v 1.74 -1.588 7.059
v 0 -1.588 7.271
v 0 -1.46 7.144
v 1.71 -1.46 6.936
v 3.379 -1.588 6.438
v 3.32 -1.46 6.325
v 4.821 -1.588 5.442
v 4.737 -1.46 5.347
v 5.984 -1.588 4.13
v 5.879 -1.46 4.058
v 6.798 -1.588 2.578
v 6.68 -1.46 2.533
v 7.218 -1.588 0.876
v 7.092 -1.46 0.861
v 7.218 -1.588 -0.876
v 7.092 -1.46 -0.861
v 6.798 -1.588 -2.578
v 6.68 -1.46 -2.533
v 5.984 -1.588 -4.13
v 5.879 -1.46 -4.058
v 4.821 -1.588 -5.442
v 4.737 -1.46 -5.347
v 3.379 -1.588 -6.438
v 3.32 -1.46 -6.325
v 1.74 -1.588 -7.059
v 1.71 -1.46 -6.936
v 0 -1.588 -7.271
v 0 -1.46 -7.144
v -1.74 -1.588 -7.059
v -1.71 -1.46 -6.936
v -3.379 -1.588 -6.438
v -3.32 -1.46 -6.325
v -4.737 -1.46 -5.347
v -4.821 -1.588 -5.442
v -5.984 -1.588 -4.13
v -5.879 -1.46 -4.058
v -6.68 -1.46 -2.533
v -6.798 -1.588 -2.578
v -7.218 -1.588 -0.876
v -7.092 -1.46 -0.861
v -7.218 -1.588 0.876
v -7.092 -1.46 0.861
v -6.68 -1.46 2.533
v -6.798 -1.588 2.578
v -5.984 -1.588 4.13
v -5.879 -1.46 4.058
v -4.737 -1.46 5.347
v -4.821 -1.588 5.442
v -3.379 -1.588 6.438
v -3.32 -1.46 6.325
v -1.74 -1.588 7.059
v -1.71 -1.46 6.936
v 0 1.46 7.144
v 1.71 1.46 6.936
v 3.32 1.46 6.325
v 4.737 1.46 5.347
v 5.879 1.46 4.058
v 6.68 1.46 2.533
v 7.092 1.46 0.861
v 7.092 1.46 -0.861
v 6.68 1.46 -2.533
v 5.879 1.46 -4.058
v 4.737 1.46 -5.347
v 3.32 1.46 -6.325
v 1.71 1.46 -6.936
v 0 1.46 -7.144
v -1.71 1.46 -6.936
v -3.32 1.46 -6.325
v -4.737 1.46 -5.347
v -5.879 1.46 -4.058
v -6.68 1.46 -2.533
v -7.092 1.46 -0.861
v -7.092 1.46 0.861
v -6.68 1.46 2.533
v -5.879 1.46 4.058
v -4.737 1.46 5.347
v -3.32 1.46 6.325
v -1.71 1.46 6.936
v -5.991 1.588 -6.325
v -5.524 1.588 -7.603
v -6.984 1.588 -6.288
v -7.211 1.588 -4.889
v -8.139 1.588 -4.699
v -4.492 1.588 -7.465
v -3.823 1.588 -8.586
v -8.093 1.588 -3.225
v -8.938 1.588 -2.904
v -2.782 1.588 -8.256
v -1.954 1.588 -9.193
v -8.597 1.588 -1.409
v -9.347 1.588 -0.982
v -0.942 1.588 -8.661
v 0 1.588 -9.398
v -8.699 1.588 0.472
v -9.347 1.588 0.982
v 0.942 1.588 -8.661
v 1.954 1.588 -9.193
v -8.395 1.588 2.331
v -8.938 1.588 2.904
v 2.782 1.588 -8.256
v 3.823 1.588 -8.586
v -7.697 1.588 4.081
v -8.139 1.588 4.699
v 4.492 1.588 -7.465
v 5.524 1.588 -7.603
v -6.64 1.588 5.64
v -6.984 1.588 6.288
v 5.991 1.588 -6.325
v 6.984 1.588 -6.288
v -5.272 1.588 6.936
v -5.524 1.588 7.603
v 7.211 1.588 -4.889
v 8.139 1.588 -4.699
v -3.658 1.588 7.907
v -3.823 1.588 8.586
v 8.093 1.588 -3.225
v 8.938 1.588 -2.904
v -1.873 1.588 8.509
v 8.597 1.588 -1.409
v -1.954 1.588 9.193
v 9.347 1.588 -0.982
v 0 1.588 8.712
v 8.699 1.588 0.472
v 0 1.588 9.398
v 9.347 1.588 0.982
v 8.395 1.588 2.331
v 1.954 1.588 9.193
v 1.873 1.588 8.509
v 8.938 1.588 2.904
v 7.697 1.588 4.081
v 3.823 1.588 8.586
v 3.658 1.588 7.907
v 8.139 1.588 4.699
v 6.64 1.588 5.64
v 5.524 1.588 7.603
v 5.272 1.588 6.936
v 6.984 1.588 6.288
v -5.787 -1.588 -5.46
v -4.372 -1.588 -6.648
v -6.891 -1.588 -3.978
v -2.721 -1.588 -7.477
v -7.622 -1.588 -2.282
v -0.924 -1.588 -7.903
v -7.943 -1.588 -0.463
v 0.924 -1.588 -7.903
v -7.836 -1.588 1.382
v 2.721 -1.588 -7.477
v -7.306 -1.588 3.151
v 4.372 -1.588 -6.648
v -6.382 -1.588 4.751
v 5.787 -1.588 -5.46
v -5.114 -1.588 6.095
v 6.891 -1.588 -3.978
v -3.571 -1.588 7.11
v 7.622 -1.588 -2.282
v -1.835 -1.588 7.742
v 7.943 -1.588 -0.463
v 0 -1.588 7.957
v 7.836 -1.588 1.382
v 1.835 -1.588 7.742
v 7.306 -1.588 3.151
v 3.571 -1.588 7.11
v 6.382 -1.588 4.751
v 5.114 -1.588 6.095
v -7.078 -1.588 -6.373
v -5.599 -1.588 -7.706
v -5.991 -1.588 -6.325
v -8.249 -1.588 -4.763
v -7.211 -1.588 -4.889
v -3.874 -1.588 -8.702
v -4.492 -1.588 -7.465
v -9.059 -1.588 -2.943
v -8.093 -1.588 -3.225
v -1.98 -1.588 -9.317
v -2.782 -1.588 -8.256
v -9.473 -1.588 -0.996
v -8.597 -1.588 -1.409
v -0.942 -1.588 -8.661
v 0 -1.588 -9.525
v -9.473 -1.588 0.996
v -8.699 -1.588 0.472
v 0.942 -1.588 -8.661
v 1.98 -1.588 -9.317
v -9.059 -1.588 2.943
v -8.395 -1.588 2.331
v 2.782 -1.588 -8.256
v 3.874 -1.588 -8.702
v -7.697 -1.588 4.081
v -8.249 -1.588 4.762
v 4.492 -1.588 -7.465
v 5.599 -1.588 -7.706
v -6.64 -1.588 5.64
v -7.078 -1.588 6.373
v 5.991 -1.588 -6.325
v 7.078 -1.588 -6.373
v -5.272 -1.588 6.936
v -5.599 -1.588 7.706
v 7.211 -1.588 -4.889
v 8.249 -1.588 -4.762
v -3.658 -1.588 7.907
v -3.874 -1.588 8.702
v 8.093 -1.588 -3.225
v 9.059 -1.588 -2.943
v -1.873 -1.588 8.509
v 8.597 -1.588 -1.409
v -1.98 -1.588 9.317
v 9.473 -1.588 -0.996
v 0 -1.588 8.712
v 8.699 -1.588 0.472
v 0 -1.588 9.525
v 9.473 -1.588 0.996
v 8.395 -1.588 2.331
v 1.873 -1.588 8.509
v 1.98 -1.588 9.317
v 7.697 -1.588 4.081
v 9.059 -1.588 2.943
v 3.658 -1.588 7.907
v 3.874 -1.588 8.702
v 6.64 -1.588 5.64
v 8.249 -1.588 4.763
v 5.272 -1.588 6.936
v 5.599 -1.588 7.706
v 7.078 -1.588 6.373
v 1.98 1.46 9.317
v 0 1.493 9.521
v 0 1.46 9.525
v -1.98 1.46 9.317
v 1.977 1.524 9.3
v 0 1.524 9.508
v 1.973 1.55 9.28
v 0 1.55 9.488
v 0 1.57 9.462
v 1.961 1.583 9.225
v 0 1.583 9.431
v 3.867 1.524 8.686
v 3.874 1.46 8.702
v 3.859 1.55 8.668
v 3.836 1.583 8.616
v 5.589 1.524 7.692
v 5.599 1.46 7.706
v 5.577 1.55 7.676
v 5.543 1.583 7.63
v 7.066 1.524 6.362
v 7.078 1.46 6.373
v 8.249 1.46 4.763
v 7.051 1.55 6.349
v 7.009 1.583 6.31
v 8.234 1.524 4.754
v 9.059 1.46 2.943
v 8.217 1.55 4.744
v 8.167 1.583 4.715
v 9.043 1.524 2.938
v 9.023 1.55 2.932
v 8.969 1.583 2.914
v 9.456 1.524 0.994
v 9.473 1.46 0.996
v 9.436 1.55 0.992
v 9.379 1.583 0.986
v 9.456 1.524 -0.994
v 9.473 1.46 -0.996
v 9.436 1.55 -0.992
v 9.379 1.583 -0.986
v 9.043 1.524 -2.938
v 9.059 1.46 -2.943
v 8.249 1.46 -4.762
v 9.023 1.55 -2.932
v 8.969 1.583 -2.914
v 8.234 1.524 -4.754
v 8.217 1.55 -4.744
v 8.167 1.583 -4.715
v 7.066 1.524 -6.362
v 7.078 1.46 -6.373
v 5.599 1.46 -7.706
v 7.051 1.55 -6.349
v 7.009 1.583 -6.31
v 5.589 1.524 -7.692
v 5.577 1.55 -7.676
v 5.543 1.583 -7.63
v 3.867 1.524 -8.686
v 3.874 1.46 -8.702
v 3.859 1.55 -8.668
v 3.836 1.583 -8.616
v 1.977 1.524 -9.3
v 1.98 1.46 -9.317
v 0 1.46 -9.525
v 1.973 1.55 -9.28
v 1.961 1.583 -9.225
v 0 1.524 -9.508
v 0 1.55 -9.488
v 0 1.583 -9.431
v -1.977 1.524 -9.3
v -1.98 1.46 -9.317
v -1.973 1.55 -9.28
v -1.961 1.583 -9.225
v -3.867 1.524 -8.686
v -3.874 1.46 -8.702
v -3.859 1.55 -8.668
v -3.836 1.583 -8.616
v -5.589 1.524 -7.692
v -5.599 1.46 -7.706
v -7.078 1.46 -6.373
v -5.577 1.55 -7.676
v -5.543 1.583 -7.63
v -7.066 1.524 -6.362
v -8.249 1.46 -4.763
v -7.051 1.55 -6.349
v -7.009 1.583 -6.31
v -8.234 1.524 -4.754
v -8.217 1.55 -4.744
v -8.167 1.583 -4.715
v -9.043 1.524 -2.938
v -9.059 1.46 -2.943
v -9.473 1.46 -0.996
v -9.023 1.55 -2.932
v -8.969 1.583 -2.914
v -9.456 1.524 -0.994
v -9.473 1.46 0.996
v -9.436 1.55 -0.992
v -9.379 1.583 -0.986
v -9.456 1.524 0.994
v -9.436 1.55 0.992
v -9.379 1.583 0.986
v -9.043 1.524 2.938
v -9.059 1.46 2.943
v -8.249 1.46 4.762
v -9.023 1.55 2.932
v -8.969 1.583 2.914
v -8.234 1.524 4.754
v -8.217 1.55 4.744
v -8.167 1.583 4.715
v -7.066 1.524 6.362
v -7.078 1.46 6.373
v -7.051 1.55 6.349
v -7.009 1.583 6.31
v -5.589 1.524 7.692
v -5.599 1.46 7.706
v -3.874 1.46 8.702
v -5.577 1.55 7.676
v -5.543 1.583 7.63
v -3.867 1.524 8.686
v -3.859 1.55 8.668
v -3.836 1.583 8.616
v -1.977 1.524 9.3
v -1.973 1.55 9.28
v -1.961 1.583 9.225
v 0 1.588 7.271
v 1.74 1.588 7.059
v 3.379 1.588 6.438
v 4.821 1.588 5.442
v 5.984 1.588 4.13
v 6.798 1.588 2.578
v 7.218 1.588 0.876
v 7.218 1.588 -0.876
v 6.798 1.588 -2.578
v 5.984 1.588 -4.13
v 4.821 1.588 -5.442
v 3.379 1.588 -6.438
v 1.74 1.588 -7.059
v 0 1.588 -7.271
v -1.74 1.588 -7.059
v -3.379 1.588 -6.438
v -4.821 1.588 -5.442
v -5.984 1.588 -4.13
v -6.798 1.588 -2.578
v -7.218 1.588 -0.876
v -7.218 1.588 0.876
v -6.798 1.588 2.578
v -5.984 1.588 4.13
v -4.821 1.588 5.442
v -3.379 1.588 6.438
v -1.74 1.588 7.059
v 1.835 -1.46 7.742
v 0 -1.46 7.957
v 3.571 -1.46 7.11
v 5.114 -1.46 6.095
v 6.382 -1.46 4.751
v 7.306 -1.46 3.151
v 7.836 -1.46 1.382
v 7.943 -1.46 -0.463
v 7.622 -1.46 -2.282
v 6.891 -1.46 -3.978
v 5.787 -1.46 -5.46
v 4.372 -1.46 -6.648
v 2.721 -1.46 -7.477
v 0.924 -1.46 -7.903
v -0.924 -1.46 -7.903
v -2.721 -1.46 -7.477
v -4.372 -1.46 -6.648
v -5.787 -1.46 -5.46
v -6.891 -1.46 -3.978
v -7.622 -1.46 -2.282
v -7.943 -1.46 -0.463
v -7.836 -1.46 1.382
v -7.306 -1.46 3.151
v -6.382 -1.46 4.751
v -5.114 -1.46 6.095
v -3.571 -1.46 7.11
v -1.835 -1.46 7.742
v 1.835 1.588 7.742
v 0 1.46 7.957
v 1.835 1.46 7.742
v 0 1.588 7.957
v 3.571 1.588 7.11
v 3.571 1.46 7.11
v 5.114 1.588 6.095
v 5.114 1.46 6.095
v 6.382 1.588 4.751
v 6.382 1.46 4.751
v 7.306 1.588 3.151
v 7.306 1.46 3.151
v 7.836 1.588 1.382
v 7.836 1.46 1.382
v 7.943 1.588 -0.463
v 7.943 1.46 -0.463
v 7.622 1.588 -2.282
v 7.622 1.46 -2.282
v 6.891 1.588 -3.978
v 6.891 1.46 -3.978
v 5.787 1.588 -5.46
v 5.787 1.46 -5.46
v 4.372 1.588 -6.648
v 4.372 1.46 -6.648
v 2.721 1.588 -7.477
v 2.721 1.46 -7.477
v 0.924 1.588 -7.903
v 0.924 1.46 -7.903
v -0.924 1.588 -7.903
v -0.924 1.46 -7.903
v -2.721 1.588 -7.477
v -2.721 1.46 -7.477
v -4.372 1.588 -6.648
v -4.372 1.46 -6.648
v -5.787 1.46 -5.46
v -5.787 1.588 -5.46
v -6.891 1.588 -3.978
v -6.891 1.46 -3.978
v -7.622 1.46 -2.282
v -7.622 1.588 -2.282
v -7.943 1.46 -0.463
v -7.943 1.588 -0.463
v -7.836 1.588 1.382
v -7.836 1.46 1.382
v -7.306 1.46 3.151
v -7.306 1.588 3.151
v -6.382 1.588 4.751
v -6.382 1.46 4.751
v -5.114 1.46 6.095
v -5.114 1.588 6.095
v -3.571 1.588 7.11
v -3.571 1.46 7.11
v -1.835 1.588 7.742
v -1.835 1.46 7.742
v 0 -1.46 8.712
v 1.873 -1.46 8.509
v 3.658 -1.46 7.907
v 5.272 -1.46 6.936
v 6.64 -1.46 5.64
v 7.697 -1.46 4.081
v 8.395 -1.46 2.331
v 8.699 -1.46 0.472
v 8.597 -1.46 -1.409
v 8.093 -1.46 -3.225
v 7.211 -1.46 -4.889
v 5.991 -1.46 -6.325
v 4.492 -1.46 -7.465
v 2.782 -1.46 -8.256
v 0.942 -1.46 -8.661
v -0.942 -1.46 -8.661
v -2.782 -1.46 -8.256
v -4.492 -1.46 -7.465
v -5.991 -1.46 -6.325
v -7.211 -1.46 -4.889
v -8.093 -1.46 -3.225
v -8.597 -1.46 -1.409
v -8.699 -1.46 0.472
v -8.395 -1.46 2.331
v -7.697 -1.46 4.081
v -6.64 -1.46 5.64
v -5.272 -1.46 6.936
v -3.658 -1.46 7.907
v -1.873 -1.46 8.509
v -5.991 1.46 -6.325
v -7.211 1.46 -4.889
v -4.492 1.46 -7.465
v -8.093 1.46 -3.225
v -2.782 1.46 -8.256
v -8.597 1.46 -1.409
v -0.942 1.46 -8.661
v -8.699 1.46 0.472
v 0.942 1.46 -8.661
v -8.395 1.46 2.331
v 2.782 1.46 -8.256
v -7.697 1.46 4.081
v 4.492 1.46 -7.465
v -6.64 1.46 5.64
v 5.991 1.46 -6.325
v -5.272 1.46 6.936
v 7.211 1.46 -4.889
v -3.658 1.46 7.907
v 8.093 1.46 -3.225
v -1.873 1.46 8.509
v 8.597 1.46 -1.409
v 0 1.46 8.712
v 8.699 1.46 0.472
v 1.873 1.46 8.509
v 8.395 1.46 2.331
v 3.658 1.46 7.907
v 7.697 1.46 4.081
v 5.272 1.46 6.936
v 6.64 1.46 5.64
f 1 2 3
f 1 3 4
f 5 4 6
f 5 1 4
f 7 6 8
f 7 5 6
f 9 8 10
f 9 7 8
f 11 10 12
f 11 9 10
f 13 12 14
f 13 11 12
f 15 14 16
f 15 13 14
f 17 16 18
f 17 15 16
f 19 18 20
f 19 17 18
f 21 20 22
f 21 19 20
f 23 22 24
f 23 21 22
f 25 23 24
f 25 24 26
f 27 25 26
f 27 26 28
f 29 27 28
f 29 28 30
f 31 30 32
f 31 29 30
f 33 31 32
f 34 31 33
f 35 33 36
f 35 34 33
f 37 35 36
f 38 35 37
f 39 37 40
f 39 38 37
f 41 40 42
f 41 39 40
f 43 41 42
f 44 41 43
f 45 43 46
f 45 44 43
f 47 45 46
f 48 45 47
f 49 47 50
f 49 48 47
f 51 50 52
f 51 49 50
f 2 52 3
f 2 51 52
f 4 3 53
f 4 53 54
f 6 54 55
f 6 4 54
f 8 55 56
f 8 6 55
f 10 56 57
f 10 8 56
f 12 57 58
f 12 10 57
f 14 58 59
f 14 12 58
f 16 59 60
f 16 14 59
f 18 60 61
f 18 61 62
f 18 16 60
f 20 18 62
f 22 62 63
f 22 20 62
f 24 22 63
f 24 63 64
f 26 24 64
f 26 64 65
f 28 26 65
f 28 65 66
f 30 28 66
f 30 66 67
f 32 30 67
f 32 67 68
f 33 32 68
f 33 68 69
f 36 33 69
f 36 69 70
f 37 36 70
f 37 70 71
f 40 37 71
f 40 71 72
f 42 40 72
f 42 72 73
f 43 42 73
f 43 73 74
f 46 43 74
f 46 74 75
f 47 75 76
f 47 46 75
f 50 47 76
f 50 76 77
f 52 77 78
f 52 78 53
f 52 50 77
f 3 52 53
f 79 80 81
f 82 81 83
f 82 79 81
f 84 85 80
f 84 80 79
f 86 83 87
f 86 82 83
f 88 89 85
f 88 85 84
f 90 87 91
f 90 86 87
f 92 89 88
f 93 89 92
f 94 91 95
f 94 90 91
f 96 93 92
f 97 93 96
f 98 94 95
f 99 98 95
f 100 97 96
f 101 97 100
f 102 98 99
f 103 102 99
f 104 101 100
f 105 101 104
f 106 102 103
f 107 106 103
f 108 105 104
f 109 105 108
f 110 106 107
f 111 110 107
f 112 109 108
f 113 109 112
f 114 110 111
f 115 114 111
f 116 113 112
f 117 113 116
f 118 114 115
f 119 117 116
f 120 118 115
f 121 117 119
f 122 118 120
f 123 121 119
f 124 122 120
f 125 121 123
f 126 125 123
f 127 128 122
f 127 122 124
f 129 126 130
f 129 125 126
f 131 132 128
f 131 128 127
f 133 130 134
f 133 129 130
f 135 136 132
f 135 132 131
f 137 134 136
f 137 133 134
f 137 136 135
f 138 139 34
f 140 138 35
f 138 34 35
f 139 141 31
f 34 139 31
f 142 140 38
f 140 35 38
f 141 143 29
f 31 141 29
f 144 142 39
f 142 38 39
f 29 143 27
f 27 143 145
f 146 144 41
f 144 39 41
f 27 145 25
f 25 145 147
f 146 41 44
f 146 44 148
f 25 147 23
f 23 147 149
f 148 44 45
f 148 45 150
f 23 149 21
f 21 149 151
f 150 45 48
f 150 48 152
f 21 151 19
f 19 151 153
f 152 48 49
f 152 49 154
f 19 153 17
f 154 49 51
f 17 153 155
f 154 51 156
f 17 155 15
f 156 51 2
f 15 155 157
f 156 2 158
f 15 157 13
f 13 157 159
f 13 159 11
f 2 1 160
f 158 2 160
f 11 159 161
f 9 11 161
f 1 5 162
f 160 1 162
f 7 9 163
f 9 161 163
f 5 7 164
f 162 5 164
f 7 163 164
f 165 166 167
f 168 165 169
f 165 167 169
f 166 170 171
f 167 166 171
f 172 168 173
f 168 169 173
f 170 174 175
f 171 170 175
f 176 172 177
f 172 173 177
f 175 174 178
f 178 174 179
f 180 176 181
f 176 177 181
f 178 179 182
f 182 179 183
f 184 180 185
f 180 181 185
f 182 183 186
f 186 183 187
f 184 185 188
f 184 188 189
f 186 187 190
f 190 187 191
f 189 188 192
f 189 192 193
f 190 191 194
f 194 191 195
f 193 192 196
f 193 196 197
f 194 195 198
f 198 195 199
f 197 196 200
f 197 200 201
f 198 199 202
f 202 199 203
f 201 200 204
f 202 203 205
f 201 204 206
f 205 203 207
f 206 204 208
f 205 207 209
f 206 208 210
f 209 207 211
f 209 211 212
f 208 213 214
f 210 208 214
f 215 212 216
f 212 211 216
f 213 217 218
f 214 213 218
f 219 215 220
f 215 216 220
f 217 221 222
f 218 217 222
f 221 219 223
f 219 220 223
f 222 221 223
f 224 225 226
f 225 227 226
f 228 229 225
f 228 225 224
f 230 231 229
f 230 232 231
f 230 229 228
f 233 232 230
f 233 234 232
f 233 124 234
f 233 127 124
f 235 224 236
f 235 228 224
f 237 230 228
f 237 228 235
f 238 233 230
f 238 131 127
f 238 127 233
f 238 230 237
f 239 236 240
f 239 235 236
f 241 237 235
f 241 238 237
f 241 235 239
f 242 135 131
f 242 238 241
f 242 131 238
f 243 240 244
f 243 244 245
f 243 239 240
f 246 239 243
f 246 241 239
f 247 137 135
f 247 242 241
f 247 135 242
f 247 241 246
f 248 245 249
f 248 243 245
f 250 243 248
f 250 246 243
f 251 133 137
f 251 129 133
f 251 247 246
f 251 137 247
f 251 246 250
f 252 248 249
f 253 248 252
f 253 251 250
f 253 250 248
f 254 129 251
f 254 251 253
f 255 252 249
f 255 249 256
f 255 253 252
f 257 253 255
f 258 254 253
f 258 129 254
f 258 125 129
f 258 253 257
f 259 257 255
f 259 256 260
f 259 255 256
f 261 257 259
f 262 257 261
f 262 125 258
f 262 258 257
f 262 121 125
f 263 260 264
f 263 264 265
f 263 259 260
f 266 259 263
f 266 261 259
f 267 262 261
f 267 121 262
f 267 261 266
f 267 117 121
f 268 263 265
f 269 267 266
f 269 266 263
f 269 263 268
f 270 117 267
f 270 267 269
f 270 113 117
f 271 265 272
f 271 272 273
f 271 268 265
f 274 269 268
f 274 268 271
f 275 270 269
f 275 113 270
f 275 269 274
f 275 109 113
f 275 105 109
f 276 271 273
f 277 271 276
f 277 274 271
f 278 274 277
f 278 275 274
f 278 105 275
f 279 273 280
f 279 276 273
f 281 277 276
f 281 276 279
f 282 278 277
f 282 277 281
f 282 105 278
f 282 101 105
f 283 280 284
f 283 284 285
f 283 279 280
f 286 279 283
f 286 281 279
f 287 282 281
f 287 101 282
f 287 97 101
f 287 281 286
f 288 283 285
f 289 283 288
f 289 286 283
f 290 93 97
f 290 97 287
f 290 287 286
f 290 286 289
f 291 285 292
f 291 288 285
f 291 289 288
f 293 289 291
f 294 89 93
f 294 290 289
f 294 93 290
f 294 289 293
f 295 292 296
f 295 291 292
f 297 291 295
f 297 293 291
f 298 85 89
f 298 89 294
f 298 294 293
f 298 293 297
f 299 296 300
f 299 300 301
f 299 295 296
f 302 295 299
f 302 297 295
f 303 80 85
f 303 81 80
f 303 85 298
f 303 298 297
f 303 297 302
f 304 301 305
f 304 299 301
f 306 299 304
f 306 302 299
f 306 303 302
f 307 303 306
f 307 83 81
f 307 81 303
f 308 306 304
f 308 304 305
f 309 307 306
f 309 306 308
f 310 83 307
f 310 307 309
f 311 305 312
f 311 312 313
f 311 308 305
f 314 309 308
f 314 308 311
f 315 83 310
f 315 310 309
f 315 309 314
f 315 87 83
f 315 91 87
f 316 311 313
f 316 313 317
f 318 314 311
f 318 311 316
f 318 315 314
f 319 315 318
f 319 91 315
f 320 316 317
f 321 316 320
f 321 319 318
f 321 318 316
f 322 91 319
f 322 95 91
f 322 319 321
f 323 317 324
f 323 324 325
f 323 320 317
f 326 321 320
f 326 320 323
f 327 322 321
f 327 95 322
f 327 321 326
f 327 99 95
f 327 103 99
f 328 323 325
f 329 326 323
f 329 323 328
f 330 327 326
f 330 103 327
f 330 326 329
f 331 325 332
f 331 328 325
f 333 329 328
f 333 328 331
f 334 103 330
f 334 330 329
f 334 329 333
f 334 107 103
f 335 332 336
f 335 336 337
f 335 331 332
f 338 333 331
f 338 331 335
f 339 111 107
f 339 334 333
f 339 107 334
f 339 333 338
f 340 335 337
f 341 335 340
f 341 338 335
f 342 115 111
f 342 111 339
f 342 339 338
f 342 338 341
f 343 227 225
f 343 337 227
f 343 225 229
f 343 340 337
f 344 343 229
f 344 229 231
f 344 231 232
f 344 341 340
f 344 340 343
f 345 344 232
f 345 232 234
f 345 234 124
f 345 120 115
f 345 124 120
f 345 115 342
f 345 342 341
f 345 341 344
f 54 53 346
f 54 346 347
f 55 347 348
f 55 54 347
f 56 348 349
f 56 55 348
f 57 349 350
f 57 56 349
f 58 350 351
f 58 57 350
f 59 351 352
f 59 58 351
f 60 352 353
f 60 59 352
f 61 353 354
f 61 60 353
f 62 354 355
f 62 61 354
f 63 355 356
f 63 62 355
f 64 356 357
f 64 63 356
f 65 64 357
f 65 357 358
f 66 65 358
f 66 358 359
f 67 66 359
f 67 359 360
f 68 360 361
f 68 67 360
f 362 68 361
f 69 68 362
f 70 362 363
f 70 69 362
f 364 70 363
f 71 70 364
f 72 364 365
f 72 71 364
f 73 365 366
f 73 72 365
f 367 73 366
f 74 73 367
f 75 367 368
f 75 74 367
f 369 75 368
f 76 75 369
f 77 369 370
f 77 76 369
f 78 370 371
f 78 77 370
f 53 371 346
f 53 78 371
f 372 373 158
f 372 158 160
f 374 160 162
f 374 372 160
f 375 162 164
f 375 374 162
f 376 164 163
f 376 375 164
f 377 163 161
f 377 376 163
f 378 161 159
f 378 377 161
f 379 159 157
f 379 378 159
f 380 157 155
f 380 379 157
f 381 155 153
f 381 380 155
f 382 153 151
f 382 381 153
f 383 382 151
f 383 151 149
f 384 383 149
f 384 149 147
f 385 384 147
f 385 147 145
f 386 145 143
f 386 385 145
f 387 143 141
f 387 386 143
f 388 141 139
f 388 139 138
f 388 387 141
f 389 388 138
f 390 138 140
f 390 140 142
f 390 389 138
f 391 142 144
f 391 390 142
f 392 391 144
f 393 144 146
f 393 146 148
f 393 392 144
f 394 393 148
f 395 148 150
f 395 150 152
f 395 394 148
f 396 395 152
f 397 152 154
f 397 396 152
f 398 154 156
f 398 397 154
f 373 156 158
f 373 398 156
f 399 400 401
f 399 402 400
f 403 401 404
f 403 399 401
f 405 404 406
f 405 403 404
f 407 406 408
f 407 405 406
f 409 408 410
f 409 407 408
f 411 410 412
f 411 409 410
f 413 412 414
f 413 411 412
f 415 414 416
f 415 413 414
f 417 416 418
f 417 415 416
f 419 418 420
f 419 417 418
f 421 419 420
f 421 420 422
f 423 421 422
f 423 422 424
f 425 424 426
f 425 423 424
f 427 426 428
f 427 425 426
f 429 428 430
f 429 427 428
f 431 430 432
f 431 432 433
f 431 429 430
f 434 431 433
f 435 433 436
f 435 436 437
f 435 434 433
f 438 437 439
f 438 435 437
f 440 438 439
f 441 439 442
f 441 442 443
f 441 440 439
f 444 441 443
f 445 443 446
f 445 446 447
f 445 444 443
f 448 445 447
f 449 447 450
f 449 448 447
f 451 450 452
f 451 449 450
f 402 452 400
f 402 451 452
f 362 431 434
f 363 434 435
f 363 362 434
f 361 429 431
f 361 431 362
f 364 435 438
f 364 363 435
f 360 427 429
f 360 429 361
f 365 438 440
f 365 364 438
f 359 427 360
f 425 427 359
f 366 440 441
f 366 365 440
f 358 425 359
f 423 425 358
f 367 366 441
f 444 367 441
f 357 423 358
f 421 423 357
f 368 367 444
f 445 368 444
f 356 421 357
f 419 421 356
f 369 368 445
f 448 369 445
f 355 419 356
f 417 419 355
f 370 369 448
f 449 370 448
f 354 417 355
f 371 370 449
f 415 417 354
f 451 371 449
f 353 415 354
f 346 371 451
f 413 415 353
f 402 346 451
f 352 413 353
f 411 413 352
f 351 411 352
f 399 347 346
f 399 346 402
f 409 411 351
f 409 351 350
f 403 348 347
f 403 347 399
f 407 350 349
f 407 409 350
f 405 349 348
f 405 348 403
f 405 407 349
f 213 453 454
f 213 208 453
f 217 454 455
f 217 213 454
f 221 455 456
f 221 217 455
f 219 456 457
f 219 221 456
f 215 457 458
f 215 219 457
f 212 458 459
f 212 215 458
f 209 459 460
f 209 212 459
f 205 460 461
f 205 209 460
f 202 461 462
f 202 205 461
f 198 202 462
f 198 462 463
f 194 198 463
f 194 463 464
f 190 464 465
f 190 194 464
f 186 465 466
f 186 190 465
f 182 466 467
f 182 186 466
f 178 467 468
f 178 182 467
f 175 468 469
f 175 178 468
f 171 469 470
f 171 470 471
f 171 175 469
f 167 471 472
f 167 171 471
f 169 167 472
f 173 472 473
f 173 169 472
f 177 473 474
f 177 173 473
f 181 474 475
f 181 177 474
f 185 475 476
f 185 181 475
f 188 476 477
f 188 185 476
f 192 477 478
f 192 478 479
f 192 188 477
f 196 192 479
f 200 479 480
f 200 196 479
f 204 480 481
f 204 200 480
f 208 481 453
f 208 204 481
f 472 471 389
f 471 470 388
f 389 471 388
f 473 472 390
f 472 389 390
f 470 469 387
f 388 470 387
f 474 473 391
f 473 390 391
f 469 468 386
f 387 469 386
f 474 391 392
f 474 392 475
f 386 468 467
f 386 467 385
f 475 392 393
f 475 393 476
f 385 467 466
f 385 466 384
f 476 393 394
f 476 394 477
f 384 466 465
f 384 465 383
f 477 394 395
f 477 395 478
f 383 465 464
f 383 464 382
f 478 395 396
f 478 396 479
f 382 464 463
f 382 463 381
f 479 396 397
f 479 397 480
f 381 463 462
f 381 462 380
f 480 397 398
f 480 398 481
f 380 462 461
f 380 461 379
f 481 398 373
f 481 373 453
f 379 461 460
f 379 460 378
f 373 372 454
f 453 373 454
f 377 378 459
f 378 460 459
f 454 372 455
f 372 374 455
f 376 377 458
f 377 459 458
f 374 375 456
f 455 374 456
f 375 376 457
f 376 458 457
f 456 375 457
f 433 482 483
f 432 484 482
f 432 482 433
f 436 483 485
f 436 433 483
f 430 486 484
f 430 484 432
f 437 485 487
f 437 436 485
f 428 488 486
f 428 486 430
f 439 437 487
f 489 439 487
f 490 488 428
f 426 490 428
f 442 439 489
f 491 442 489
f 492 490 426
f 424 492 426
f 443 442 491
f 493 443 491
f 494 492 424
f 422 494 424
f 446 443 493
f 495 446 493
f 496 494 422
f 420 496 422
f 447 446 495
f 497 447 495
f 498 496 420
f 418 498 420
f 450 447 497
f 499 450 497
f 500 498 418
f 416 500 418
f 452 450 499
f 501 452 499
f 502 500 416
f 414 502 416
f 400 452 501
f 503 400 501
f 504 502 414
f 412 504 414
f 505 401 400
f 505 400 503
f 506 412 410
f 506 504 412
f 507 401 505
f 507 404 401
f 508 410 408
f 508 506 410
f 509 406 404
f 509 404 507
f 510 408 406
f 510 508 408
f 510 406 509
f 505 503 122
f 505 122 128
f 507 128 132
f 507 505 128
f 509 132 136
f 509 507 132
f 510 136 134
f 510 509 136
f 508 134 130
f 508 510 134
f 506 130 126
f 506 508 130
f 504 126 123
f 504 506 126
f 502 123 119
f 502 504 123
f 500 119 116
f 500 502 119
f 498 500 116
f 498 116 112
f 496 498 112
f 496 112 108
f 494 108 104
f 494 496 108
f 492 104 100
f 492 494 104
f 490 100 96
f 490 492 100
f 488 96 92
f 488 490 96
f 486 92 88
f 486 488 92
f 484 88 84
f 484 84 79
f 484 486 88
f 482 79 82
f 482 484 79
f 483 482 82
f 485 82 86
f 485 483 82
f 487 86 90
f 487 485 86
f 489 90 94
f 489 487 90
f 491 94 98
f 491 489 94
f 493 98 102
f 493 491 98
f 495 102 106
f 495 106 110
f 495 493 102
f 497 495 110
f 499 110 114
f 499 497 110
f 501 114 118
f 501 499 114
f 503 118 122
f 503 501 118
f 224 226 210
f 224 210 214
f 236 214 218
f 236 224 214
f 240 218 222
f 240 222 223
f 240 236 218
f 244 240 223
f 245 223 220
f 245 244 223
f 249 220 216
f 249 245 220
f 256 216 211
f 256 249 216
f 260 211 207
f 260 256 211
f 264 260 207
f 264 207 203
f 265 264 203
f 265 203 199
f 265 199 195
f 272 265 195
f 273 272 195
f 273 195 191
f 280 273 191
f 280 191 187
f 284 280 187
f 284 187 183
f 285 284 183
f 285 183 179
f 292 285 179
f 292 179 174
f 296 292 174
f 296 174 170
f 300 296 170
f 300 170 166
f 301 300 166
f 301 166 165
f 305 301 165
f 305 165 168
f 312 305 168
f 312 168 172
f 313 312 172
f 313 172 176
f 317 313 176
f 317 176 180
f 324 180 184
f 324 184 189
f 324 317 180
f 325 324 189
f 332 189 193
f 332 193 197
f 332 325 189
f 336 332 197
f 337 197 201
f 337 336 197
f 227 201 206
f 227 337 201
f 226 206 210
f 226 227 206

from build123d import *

# Parameters (mm, degrees)
SKETCH1_R             = 9.525
SKETCH1_R_2           = 8.7122
BOSS_EXTRUDE1_DEPTH   = 1.5875
SKETCH1_R_3           = 7.95655
SKETCH1_R_4           = 7.14375
BOSS_EXTRUDE1_2_DEPTH = 1.5875
FILLET1_R             = 0.127
CHAMFER1_SIZE         = 0.127
SKETCH2_R             = 8.7122
SKETCH2_R_2           = 7.95655
BOSS_EXTRUDE2_DEPTH   = 1.4605


with BuildPart() as part:
    # Sketch1 → Boss-Extrude1 (new, symmetric)
    with BuildSketch(Plane(origin=(0, 0, 0), x_dir=(1, 0, 0), z_dir=(0, 1, 0))):
        with Locations(Location((0, 0, 0), (0, 0, 270))):
            Circle(SKETCH1_R)
        with Locations(Location((0, 0, 0), (0, 0, 270))):
            Circle(SKETCH1_R_2, mode=Mode.SUBTRACT)
    extrude(amount=BOSS_EXTRUDE1_DEPTH, both=True)

    # Fillet1
    fillet1_edges = [part.edges().sort_by_distance(p)[0] for p in [
        (0, 1.5875, -9.525),
    ]]
    fillet(fillet1_edges, radius=FILLET1_R)



with BuildPart() as body_2:
    # Sketch1 → Boss-Extrude1 2 (new, symmetric)
    with BuildSketch(Plane(origin=(0, 0, 0), x_dir=(1, 0, 0), z_dir=(0, 1, 0))):
        with Locations(Location((0, 0, 0), (0, 0, 270))):
            Circle(SKETCH1_R_3)
        with Locations(Location((0, 0, 0), (0, 0, 270))):
            Circle(SKETCH1_R_4, mode=Mode.SUBTRACT)
    extrude(amount=BOSS_EXTRUDE1_2_DEPTH, both=True)

    # Chamfer1
    chamfer1_edges = [body_2.edges().sort_by_distance(p)[0] for p in [
        (0, -1.5875, -7.14375),
        (0, 1.5875, -7.14375),
    ]]
    chamfer(chamfer1_edges, length=CHAMFER1_SIZE)


with BuildPart() as part_1:
    add(part.part)

    add(body_2.part)  # Boss-Extrude2 merges body 2
    # Sketch2 → Boss-Extrude2 (add, symmetric)
    with BuildSketch(Plane(origin=(0, 0, 0), x_dir=(1, 0, 0), z_dir=(0, 1, 0))):
        with Locations(Location((0, 0, 0), (0, 0, 270))):
            Circle(SKETCH2_R)
        with Locations(Location((0, 0, 0), (0, 0, 270))):
            Circle(SKETCH2_R_2, mode=Mode.SUBTRACT)
    extrude(amount=BOSS_EXTRUDE2_DEPTH, both=True)


solid = part_1.part
